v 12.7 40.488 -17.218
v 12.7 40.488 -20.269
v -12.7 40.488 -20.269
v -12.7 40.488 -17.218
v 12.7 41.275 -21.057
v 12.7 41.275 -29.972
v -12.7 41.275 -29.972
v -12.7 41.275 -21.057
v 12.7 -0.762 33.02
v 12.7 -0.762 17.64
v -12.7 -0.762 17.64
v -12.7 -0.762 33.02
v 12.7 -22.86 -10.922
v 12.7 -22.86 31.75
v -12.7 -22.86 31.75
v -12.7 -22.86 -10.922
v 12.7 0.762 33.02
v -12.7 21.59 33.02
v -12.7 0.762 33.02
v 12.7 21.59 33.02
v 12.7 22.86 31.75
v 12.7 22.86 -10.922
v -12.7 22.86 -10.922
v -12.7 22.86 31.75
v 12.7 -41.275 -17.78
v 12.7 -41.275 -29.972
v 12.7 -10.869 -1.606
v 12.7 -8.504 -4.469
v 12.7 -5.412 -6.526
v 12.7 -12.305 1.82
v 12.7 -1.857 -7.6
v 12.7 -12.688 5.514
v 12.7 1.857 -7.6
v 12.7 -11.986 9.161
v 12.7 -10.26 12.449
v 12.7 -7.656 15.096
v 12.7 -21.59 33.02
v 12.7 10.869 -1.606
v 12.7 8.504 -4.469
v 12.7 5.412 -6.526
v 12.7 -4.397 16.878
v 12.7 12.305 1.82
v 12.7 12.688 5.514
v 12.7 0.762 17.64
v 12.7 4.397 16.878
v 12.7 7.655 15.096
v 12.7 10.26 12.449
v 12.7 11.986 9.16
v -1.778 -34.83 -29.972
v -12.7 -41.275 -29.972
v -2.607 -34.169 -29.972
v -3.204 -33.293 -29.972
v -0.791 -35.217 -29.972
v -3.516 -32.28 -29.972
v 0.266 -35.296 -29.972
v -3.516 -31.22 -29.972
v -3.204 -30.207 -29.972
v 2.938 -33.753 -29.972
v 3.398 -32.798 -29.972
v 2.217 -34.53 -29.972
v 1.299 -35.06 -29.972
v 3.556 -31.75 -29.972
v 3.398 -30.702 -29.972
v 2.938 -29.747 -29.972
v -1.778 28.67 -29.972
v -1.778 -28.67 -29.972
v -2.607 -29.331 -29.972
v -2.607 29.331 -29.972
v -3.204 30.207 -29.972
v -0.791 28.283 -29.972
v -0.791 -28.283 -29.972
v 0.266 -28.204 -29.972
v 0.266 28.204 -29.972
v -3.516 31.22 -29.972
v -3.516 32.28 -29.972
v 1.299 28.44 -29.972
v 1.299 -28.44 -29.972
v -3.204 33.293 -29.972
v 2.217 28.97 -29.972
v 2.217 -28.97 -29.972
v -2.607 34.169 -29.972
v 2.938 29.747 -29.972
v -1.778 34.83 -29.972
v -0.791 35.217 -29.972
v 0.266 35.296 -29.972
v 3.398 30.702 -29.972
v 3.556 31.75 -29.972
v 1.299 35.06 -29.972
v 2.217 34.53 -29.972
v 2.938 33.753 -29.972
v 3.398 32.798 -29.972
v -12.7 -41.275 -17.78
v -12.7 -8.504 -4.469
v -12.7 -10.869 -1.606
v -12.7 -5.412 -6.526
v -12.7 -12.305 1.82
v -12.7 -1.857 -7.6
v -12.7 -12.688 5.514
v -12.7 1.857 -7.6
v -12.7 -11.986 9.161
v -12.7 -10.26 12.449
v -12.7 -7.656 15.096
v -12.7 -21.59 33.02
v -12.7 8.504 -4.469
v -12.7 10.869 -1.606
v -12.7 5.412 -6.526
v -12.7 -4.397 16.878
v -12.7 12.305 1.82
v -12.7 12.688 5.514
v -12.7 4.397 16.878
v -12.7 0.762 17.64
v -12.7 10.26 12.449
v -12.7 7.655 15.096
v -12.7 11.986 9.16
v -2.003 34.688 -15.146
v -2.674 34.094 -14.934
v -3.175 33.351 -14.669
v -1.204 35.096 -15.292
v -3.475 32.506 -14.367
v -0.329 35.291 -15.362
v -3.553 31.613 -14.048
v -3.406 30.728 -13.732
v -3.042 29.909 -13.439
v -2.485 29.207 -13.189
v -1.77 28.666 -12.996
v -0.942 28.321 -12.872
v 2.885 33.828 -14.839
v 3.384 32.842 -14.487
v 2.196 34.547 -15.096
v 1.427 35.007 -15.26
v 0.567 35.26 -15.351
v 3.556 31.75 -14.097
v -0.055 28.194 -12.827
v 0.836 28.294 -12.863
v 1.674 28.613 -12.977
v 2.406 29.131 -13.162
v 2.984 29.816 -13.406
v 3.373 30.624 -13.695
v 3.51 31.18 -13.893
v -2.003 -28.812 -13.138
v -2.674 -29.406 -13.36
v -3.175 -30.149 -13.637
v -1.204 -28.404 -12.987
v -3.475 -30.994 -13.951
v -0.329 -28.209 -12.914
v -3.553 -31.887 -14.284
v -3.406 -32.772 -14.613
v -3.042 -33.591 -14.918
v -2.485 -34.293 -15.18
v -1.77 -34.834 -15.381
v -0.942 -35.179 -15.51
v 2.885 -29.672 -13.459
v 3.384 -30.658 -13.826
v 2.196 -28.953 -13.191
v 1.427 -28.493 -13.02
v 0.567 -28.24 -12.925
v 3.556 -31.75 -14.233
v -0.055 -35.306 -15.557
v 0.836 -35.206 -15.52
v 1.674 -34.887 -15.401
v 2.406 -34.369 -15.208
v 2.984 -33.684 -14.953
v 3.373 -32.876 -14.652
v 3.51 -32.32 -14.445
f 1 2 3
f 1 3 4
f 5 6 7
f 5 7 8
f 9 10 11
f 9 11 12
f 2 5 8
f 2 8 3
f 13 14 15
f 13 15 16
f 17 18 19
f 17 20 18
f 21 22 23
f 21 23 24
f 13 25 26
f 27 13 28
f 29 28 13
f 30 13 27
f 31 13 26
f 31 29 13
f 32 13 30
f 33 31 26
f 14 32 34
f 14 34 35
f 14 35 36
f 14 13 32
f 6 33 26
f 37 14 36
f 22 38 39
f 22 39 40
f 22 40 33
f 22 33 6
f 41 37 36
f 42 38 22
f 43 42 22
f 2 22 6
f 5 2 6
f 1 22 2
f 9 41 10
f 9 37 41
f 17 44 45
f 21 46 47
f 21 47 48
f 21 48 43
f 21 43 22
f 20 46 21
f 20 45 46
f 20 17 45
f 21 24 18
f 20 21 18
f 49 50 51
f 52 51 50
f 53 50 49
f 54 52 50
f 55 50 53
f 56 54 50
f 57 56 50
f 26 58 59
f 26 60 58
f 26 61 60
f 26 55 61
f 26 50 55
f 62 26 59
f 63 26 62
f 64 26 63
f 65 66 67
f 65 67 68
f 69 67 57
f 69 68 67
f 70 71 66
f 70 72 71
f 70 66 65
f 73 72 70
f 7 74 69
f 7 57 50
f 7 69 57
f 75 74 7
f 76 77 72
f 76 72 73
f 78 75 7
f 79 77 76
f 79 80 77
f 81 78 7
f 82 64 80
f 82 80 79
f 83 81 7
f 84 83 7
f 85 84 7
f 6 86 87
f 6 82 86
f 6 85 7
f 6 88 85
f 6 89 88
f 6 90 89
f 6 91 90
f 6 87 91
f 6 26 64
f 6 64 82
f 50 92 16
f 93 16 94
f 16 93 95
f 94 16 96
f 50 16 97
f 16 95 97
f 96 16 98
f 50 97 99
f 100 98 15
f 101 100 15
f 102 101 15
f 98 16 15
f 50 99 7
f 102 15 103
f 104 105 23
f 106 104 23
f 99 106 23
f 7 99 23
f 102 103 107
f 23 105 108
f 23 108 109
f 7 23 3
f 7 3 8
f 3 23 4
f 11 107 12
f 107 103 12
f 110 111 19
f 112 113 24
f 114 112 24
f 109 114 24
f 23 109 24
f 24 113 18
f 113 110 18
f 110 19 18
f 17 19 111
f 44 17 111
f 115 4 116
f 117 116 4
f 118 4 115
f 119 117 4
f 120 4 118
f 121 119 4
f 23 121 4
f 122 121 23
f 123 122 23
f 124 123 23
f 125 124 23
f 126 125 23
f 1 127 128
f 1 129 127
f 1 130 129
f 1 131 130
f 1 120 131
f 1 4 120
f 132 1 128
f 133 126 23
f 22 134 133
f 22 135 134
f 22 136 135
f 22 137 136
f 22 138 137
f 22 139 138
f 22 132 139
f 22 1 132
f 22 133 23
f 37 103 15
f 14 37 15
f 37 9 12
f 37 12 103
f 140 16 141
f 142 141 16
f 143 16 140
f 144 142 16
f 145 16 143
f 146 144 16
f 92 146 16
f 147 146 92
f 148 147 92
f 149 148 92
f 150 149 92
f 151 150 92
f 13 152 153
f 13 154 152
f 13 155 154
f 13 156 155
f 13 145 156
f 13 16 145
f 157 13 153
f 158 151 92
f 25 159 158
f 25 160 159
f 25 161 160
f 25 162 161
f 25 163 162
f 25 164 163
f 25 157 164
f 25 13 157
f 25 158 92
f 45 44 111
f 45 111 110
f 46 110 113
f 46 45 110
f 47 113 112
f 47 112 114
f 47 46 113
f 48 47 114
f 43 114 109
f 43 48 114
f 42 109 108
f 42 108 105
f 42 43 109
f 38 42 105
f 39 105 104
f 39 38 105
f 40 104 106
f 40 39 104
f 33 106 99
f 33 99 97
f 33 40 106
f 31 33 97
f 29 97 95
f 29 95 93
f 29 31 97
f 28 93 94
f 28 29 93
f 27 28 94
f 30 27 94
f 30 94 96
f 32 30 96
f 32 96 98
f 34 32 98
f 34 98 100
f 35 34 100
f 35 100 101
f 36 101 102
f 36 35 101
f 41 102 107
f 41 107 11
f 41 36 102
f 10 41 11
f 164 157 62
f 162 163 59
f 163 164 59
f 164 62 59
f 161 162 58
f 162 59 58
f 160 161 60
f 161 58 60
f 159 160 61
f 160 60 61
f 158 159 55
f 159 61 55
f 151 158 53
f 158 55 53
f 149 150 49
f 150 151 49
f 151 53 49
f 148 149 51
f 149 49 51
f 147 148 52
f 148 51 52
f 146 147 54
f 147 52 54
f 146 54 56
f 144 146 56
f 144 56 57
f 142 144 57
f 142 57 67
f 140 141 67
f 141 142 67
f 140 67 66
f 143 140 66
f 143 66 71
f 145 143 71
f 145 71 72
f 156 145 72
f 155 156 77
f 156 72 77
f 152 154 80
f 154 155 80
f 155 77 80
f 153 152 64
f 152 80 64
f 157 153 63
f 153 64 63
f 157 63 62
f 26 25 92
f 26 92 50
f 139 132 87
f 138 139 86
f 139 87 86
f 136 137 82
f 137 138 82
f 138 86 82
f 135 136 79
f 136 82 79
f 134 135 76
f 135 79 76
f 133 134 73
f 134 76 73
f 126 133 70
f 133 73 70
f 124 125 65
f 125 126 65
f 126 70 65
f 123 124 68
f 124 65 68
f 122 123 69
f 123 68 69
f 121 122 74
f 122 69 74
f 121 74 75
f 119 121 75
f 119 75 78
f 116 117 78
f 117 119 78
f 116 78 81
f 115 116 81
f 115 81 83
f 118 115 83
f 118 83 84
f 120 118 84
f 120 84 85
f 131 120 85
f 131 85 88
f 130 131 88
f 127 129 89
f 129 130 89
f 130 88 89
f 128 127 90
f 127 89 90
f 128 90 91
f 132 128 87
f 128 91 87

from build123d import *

# Parameters (mm, degrees)
F1_DEPTH = 12.7
F2_R     = 3.556
F3_DEPTH = 62.993


# Not quite as in the source:
# - ends of sketch curves that miss each other by under 0.0002 mm in the source are joined


with BuildPart() as f1:
    # F0 (on Right) → F1 (new body, symmetric)
    with BuildSketch(Plane.YZ):
        with BuildLine():
            Line((0.762, 33.02), (0.762, 17.6402746))
            ThreePointArc((0.762, 17.6402746), (0, -7.73684), (-0.7620002868, 17.6402793716))
            Line((-0.7620002868, 17.6402793716), (-0.762, 33.02))
            Line((-0.762, 33.02), (-21.59, 33.02))
            Line((-21.59, 33.02), (-22.86, 31.75))
            Line((-22.86, 31.75), (-22.86, -10.922))
            Line((-22.86, -10.922), (-41.275, -17.78))
            Line((-41.275, -17.78), (-41.275, -29.972))
            Line((-41.275, -29.972), (41.275, -29.972))
            Line((41.275, -29.972), (41.275, -21.0566))
            Line((41.275, -21.0566), (40.4876, -20.2692))
            Line((40.4876, -20.2692), (40.4876, -17.2175678))
            Line((40.4876, -17.2175678), (22.86, -10.922))
            Line((22.86, -10.922), (22.86, 31.75))
            Line((22.86, 31.75), (21.59, 33.02))
            Line((21.59, 33.02), (0.762, 33.02))
        make_face()
    extrude(amount=F1_DEPTH, both=True)

    # F2 (on face) → F3 (cut, through all)
    with BuildSketch(Plane(origin=(0, 0, -29.972), x_dir=(1, 0, 0), z_dir=(0, 0, -1))):
        with Locations((0, 31.75)):
            Circle(F2_R)
        with Locations((0, -31.75)):
            Circle(F2_R)
    extrude(amount=-F3_DEPTH, mode=Mode.SUBTRACT)


solid = f1.part
